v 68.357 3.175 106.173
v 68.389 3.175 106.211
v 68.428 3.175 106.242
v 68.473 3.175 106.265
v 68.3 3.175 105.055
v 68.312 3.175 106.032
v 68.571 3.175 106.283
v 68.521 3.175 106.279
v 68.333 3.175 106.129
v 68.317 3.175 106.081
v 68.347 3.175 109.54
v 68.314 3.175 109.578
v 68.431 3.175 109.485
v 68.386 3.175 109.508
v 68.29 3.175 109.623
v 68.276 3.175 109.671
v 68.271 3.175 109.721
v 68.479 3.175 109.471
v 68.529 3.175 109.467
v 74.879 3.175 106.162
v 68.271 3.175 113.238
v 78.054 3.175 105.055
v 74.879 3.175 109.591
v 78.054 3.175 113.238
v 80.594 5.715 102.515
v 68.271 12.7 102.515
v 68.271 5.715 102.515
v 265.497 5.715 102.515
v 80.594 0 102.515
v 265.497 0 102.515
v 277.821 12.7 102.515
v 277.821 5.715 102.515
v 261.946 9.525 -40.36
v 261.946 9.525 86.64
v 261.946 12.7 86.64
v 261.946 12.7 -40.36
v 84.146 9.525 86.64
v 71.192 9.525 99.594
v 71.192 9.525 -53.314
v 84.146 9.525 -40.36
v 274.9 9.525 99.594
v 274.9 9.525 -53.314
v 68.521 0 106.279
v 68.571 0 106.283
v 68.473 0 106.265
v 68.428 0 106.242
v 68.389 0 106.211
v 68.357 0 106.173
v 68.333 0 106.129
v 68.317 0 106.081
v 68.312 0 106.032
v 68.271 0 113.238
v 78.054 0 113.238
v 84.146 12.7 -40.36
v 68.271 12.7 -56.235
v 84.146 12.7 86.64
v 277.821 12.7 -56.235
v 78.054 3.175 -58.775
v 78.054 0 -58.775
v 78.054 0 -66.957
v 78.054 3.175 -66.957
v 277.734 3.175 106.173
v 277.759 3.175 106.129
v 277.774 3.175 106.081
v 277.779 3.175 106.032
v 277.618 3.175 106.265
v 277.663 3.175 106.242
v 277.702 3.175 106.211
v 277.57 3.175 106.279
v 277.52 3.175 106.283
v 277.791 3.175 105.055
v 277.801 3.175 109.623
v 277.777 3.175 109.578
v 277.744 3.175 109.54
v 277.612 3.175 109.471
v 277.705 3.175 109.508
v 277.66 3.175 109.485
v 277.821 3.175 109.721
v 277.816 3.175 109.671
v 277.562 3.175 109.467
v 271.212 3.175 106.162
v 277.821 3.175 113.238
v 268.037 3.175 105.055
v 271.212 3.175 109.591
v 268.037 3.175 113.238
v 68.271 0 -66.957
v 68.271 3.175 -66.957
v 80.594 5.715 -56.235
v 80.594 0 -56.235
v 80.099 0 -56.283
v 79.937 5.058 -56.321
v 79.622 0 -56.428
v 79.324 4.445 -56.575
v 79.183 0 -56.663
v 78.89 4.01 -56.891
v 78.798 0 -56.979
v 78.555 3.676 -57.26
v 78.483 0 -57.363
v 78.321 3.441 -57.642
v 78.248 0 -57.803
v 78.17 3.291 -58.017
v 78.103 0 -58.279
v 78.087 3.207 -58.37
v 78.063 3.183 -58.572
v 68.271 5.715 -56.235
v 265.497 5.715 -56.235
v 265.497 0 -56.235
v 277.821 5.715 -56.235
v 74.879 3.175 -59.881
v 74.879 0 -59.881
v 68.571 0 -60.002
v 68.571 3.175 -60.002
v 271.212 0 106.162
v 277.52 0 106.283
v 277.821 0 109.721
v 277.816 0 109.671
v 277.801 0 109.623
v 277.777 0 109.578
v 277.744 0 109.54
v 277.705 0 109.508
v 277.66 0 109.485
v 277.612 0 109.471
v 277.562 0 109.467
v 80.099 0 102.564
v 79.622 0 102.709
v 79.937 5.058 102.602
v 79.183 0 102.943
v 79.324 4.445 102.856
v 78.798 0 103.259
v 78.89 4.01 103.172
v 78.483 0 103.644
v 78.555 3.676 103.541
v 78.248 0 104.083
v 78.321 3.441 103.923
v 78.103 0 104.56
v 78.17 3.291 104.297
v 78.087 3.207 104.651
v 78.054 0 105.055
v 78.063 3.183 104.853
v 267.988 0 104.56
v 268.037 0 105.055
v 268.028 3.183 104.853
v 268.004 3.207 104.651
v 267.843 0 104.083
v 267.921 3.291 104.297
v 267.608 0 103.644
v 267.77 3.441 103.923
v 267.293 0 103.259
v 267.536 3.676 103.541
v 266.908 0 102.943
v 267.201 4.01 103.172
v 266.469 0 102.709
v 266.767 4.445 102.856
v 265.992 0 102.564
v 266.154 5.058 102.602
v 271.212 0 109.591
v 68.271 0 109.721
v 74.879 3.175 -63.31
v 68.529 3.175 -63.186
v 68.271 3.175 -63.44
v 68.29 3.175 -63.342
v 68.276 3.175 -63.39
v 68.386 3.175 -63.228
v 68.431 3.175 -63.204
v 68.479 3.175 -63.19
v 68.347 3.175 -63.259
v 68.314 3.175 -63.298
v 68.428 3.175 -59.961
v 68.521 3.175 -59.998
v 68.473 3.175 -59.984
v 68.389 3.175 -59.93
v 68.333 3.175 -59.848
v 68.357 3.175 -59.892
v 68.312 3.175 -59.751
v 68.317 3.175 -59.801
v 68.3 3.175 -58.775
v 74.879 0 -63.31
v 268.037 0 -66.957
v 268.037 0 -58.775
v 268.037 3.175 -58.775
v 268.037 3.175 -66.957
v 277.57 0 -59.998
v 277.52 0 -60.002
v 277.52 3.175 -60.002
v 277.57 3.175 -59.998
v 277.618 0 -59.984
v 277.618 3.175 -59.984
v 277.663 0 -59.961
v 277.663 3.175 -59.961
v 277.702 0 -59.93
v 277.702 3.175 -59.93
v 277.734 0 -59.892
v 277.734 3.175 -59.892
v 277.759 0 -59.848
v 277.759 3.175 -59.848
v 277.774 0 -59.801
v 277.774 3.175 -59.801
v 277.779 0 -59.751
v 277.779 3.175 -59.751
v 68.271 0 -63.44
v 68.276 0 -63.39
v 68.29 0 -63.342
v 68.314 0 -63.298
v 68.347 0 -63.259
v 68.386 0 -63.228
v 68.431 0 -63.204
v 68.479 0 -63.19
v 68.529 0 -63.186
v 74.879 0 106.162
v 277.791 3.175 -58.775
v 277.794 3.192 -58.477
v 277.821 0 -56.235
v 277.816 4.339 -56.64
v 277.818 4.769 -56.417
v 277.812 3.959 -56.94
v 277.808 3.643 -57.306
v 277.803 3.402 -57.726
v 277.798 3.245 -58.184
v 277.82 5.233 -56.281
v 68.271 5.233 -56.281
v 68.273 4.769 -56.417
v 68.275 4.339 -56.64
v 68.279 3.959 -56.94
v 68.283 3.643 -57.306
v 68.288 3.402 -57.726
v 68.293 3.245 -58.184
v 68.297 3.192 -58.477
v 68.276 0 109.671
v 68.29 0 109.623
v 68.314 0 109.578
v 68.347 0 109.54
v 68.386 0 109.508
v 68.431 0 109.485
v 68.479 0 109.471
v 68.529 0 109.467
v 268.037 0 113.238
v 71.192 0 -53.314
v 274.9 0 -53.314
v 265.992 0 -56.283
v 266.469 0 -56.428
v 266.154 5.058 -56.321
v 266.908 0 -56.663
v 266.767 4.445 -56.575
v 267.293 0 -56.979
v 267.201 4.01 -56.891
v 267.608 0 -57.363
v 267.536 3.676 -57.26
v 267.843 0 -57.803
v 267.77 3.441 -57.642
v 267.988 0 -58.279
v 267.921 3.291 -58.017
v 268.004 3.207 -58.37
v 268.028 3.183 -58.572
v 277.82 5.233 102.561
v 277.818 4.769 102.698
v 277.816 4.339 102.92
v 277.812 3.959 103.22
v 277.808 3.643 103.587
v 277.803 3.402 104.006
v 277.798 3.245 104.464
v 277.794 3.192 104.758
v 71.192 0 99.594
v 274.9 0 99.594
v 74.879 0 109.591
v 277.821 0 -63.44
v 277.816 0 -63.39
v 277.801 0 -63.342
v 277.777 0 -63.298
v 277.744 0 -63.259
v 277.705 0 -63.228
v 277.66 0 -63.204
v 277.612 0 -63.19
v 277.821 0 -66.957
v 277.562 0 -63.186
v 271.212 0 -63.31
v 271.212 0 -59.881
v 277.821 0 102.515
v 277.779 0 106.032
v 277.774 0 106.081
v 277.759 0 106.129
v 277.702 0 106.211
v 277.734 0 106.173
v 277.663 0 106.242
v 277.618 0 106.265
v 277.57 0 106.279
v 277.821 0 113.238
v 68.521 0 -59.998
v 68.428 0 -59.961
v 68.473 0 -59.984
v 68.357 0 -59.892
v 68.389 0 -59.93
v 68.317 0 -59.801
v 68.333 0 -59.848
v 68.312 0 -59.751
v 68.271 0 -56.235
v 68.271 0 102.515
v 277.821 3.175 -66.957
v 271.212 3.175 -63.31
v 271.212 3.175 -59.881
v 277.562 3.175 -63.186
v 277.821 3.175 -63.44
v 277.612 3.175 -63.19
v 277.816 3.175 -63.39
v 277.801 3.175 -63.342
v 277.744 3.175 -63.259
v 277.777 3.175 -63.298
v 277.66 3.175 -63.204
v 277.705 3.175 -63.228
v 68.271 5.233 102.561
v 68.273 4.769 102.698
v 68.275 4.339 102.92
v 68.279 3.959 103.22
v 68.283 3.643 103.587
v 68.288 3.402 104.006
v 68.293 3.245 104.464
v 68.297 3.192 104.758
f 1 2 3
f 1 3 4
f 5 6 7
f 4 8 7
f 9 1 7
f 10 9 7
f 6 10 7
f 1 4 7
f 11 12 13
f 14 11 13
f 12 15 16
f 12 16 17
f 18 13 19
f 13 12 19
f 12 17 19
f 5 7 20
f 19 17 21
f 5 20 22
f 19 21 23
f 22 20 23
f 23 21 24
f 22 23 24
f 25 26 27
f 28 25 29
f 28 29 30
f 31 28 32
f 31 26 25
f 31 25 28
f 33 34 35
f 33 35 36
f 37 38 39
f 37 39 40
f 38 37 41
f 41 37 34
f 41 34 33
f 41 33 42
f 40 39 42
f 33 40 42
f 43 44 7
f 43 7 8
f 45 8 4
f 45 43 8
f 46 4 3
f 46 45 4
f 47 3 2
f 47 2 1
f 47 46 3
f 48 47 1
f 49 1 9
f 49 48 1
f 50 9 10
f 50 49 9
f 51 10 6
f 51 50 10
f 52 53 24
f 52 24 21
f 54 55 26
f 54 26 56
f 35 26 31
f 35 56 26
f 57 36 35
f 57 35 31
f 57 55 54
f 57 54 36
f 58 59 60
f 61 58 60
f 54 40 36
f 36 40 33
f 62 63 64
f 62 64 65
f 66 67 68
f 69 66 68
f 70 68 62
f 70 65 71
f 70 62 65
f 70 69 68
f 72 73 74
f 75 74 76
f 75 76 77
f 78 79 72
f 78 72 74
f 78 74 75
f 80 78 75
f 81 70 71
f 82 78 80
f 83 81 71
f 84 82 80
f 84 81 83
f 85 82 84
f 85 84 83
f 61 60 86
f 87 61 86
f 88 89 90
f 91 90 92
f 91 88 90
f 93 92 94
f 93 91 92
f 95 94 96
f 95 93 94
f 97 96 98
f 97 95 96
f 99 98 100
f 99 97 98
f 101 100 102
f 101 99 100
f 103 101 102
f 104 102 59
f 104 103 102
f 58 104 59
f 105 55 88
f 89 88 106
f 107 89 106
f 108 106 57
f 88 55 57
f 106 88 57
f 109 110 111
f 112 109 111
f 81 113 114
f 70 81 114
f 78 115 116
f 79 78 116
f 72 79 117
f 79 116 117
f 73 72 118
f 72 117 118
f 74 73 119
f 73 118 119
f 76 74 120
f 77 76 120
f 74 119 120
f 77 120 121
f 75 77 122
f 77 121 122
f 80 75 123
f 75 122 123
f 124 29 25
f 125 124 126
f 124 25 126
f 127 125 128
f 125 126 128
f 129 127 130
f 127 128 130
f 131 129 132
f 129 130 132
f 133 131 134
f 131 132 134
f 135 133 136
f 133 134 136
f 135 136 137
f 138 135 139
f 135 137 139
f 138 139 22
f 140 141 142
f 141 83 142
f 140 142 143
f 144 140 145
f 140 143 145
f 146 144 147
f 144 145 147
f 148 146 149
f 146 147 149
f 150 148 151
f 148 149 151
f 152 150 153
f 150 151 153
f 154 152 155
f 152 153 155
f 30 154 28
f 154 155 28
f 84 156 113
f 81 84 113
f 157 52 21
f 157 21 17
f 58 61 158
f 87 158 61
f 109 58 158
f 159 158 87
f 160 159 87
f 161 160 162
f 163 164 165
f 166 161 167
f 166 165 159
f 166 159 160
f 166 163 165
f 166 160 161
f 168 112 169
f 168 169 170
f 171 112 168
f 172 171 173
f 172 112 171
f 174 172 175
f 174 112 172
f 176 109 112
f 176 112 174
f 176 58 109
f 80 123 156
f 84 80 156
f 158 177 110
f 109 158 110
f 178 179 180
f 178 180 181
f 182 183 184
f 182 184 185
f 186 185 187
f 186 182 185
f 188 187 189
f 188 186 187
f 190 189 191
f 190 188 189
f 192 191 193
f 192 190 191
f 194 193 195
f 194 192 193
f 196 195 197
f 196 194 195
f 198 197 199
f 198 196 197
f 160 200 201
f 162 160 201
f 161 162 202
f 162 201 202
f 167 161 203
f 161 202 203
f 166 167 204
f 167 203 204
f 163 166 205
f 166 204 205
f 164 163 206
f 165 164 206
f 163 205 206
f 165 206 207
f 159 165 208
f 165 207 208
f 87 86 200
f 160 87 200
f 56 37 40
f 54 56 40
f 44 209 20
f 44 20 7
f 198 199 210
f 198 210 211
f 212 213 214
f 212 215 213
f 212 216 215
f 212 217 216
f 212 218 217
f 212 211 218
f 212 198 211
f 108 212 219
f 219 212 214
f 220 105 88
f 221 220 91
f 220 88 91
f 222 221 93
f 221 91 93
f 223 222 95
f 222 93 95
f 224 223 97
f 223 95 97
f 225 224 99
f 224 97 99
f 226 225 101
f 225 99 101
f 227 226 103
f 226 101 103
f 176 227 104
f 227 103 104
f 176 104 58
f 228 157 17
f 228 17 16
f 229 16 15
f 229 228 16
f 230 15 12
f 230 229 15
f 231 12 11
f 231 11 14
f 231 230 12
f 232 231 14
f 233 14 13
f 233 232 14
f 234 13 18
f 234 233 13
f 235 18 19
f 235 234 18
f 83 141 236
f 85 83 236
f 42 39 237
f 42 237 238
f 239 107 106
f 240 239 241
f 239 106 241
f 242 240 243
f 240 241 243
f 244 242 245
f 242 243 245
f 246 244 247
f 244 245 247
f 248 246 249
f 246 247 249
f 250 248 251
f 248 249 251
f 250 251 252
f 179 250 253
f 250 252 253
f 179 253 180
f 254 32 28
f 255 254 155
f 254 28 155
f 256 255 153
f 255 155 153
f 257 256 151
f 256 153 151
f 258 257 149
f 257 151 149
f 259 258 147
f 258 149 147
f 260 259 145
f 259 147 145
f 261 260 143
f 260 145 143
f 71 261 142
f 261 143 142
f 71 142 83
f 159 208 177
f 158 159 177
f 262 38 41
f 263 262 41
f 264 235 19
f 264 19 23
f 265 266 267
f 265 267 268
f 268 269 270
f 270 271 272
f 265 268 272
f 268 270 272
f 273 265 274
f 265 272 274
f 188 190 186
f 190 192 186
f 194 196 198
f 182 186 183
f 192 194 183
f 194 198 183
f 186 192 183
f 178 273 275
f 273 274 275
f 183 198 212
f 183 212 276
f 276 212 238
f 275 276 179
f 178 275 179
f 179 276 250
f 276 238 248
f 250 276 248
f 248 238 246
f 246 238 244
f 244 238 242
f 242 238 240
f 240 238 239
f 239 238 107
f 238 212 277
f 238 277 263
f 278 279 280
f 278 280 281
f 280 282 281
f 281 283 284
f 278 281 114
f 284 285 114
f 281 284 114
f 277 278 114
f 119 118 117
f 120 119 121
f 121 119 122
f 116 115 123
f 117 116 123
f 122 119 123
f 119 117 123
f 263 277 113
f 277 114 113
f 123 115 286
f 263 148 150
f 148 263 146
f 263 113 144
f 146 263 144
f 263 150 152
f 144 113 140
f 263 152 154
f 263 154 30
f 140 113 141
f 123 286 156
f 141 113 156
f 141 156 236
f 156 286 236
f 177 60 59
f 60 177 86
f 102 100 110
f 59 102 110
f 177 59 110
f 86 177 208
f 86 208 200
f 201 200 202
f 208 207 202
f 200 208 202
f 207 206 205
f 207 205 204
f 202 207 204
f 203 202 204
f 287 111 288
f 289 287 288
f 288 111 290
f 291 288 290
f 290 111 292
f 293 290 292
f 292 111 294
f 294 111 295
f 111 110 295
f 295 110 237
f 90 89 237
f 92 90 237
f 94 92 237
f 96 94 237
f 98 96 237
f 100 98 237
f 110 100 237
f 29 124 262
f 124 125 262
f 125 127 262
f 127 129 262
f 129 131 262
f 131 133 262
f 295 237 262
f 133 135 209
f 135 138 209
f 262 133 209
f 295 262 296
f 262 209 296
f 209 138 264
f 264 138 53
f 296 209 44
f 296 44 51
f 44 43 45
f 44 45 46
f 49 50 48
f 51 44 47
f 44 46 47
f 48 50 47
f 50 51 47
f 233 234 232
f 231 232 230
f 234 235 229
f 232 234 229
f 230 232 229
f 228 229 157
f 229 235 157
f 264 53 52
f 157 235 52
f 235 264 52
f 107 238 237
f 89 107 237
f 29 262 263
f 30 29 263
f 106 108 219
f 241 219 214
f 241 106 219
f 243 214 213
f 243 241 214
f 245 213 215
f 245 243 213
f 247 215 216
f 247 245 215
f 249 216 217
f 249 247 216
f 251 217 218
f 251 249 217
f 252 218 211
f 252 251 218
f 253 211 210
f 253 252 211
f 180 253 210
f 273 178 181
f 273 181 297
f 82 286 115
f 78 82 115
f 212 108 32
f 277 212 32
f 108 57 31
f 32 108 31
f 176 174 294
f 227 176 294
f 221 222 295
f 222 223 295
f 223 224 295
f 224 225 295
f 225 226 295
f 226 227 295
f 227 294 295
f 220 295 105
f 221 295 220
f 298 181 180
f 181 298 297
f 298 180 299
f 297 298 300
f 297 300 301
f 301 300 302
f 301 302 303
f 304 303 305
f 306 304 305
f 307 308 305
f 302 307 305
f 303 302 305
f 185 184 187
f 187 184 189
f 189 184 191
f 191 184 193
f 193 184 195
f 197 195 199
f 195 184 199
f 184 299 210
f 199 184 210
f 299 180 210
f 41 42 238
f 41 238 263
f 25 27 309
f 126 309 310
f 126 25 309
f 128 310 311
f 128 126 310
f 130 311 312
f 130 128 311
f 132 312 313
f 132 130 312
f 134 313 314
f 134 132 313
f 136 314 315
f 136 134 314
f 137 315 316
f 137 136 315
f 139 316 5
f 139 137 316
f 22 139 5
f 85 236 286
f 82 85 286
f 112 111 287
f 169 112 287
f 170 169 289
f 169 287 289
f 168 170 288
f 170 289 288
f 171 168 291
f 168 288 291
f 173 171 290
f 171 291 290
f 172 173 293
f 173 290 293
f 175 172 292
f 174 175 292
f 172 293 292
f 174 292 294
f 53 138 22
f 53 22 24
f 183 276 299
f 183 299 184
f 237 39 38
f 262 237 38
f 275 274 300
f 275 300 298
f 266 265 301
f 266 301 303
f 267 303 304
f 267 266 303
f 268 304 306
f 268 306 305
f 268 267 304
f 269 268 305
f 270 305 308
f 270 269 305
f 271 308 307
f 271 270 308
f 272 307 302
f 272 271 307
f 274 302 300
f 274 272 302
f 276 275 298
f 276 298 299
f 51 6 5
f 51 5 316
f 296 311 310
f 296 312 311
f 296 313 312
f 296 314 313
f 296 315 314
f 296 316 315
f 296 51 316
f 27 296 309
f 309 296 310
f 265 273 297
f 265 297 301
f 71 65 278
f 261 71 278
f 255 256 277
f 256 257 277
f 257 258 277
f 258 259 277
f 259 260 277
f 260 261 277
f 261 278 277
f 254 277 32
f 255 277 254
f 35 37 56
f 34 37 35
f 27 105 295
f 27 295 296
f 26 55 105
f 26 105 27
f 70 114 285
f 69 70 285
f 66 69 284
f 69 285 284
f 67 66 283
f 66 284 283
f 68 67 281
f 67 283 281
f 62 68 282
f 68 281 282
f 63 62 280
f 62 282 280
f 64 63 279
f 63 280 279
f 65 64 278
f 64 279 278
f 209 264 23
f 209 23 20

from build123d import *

# Parameters (mm, degrees)
SKETCH1_W               = 209.55
SKETCH1_H               = 158.75
SKETCH1_W_2             = 177.8
SKETCH1_H_2             = 127
FRONTFACE_DEPTH         = 3.175
SKETCH3_W               = 209.55
SKETCH3_H               = 158.75
SKETCH3_W_2             = 203.708
SKETCH3_H_2             = 152.908
SIDESHELL_DEPTH         = 9.525
BOTTOMSUPPORTLOCK_DEPTH = 3.175
FILLET1_R               = 2.54


with BuildPart() as part:
    # Sketch1 → FrontFace (new body)
    with BuildSketch(Plane(origin=(0, 9.525, 0), x_dir=(1, 0, 0), z_dir=(0, 1, 0))):
        with Locations((173.045515995, -23.140372536)):
            Rectangle(SKETCH1_W, SKETCH1_H)
        with Locations((173.045515995, -23.140372536)):
            Rectangle(SKETCH1_W_2, SKETCH1_H_2, mode=Mode.SUBTRACT)
    extrude(amount=FRONTFACE_DEPTH)

    # Sketch3 → SideShell (add)
    with BuildSketch(Plane.XZ.offset(-9.525)):
        with Locations((173.045515995, 23.140372536)):
            Rectangle(SKETCH3_W, SKETCH3_H)
        with Locations((173.045515995, 23.140372536)):
            Rectangle(SKETCH3_W_2, SKETCH3_H_2, mode=Mode.SUBTRACT)
    extrude(amount=SIDESHELL_DEPTH)

    # Sketch9 → BottomSupportLock (add)
    with BuildSketch(Plane.XZ):
        with BuildLine():
            Line((277.820515995, 102.515372536), (268.036564976, 102.515372536))
            Line((268.036564976, 102.515372536), (268.036564976, 113.237616687))
            Line((268.036564976, 113.237616687), (277.820515995, 113.237616687))
            Line((277.820515995, 113.237616687), (277.820515995, 109.721147351))
            ThreePointArc((277.820515995, 109.721147351), (277.744362054, 109.539800226), (277.561564976, 109.467195608))
            Line((277.561564976, 109.467195608), (271.211564976, 109.590994612))
            Line((271.211564976, 109.590994612), (271.211564976, 106.161994612))
            Line((271.211564976, 106.161994612), (277.520350721, 106.282567338))
            ThreePointArc((277.520350721, 106.282567338), (277.702016533, 106.210968908), (277.779186707, 106.031598992))
            Line((277.779186707, 106.031598992), (277.820515995, 102.515372536))
        make_face()
        with BuildLine():
            Line((277.779186707, -59.750853919), (277.820515995, -56.234627464))
            Line((277.820515995, -56.234627464), (268.036564976, -56.234627464))
            Line((268.036564976, -56.234627464), (268.036564976, -66.956871614))
            Line((268.036564976, -66.956871614), (277.820515995, -66.956871614))
            Line((277.820515995, -66.956871614), (277.820515995, -63.440402278))
            ThreePointArc((277.820515995, -63.440402278), (277.744362054, -63.259055154), (277.561564976, -63.186450536))
            Line((277.561564976, -63.186450536), (271.211564976, -63.310249539))
            Line((271.211564976, -63.310249539), (271.211564976, -59.881249539))
            Line((271.211564976, -59.881249539), (277.520350721, -60.001822265))
            ThreePointArc((277.520350721, -60.001822265), (277.702016533, -59.930223835), (277.779186707, -59.750853919))
        make_face()
        with BuildLine():
            Line((68.270515995, -56.234627464), (78.054467015, -56.234627464))
            Line((78.054467015, -56.234627464), (78.054467015, -66.956871614))
            Line((78.054467015, -66.956871614), (68.270515995, -66.956871614))
            Line((68.270515995, -66.956871614), (68.270515995, -63.440402278))
            ThreePointArc((68.270515995, -63.440402278), (68.346669937, -63.259055154), (68.529467015, -63.186450536))
            Line((68.529467015, -63.186450536), (74.879467015, -63.310249539))
            Line((74.879467015, -63.310249539), (74.879467015, -59.881249539))
            Line((74.879467015, -59.881249539), (68.57068127, -60.001822265))
            ThreePointArc((68.57068127, -60.001822265), (68.389015458, -59.930223835), (68.311845284, -59.750853919))
            Line((68.311845284, -59.750853919), (68.270515995, -56.234627464))
        make_face()
        with BuildLine():
            Line((68.311845284, 106.031598992), (68.270515995, 102.515372536))
            Line((68.270515995, 102.515372536), (78.054467015, 102.515372536))
            Line((78.054467015, 102.515372536), (78.054467015, 113.237616687))
            Line((78.054467015, 113.237616687), (68.270515995, 113.237616687))
            Line((68.270515995, 113.237616687), (68.270515995, 109.721147351))
            ThreePointArc((68.270515995, 109.721147351), (68.346669937, 109.539800226), (68.529467015, 109.467195608))
            Line((68.529467015, 109.467195608), (74.879467015, 109.590994612))
            Line((74.879467015, 109.590994612), (74.879467015, 106.161994612))
            Line((74.879467015, 106.161994612), (68.57068127, 106.282567338))
            ThreePointArc((68.57068127, 106.282567338), (68.389015458, 106.210968908), (68.311845284, 106.031598992))
        make_face()
    extrude(amount=-BOTTOMSUPPORTLOCK_DEPTH)

    # Fillet1
    fillet1_edges = [part.edges().sort_by_distance(p)[0] for p in [
        (73.162491505, 3.175, 102.515372536),
        (78.054467015, 1.5875, 102.515372536),
        (272.928540486, 3.175, 102.515372536),
        (268.036564976, 1.5875, 102.515372536),
        (272.928540486, 3.175, -56.234627464),
        (268.036564976, 1.5875, -56.234627464),
        (73.162491505, 3.175, -56.234627464),
        (78.054467015, 1.5875, -56.234627464),
    ]]
    fillet(fillet1_edges, radius=FILLET1_R)


solid = part.part
